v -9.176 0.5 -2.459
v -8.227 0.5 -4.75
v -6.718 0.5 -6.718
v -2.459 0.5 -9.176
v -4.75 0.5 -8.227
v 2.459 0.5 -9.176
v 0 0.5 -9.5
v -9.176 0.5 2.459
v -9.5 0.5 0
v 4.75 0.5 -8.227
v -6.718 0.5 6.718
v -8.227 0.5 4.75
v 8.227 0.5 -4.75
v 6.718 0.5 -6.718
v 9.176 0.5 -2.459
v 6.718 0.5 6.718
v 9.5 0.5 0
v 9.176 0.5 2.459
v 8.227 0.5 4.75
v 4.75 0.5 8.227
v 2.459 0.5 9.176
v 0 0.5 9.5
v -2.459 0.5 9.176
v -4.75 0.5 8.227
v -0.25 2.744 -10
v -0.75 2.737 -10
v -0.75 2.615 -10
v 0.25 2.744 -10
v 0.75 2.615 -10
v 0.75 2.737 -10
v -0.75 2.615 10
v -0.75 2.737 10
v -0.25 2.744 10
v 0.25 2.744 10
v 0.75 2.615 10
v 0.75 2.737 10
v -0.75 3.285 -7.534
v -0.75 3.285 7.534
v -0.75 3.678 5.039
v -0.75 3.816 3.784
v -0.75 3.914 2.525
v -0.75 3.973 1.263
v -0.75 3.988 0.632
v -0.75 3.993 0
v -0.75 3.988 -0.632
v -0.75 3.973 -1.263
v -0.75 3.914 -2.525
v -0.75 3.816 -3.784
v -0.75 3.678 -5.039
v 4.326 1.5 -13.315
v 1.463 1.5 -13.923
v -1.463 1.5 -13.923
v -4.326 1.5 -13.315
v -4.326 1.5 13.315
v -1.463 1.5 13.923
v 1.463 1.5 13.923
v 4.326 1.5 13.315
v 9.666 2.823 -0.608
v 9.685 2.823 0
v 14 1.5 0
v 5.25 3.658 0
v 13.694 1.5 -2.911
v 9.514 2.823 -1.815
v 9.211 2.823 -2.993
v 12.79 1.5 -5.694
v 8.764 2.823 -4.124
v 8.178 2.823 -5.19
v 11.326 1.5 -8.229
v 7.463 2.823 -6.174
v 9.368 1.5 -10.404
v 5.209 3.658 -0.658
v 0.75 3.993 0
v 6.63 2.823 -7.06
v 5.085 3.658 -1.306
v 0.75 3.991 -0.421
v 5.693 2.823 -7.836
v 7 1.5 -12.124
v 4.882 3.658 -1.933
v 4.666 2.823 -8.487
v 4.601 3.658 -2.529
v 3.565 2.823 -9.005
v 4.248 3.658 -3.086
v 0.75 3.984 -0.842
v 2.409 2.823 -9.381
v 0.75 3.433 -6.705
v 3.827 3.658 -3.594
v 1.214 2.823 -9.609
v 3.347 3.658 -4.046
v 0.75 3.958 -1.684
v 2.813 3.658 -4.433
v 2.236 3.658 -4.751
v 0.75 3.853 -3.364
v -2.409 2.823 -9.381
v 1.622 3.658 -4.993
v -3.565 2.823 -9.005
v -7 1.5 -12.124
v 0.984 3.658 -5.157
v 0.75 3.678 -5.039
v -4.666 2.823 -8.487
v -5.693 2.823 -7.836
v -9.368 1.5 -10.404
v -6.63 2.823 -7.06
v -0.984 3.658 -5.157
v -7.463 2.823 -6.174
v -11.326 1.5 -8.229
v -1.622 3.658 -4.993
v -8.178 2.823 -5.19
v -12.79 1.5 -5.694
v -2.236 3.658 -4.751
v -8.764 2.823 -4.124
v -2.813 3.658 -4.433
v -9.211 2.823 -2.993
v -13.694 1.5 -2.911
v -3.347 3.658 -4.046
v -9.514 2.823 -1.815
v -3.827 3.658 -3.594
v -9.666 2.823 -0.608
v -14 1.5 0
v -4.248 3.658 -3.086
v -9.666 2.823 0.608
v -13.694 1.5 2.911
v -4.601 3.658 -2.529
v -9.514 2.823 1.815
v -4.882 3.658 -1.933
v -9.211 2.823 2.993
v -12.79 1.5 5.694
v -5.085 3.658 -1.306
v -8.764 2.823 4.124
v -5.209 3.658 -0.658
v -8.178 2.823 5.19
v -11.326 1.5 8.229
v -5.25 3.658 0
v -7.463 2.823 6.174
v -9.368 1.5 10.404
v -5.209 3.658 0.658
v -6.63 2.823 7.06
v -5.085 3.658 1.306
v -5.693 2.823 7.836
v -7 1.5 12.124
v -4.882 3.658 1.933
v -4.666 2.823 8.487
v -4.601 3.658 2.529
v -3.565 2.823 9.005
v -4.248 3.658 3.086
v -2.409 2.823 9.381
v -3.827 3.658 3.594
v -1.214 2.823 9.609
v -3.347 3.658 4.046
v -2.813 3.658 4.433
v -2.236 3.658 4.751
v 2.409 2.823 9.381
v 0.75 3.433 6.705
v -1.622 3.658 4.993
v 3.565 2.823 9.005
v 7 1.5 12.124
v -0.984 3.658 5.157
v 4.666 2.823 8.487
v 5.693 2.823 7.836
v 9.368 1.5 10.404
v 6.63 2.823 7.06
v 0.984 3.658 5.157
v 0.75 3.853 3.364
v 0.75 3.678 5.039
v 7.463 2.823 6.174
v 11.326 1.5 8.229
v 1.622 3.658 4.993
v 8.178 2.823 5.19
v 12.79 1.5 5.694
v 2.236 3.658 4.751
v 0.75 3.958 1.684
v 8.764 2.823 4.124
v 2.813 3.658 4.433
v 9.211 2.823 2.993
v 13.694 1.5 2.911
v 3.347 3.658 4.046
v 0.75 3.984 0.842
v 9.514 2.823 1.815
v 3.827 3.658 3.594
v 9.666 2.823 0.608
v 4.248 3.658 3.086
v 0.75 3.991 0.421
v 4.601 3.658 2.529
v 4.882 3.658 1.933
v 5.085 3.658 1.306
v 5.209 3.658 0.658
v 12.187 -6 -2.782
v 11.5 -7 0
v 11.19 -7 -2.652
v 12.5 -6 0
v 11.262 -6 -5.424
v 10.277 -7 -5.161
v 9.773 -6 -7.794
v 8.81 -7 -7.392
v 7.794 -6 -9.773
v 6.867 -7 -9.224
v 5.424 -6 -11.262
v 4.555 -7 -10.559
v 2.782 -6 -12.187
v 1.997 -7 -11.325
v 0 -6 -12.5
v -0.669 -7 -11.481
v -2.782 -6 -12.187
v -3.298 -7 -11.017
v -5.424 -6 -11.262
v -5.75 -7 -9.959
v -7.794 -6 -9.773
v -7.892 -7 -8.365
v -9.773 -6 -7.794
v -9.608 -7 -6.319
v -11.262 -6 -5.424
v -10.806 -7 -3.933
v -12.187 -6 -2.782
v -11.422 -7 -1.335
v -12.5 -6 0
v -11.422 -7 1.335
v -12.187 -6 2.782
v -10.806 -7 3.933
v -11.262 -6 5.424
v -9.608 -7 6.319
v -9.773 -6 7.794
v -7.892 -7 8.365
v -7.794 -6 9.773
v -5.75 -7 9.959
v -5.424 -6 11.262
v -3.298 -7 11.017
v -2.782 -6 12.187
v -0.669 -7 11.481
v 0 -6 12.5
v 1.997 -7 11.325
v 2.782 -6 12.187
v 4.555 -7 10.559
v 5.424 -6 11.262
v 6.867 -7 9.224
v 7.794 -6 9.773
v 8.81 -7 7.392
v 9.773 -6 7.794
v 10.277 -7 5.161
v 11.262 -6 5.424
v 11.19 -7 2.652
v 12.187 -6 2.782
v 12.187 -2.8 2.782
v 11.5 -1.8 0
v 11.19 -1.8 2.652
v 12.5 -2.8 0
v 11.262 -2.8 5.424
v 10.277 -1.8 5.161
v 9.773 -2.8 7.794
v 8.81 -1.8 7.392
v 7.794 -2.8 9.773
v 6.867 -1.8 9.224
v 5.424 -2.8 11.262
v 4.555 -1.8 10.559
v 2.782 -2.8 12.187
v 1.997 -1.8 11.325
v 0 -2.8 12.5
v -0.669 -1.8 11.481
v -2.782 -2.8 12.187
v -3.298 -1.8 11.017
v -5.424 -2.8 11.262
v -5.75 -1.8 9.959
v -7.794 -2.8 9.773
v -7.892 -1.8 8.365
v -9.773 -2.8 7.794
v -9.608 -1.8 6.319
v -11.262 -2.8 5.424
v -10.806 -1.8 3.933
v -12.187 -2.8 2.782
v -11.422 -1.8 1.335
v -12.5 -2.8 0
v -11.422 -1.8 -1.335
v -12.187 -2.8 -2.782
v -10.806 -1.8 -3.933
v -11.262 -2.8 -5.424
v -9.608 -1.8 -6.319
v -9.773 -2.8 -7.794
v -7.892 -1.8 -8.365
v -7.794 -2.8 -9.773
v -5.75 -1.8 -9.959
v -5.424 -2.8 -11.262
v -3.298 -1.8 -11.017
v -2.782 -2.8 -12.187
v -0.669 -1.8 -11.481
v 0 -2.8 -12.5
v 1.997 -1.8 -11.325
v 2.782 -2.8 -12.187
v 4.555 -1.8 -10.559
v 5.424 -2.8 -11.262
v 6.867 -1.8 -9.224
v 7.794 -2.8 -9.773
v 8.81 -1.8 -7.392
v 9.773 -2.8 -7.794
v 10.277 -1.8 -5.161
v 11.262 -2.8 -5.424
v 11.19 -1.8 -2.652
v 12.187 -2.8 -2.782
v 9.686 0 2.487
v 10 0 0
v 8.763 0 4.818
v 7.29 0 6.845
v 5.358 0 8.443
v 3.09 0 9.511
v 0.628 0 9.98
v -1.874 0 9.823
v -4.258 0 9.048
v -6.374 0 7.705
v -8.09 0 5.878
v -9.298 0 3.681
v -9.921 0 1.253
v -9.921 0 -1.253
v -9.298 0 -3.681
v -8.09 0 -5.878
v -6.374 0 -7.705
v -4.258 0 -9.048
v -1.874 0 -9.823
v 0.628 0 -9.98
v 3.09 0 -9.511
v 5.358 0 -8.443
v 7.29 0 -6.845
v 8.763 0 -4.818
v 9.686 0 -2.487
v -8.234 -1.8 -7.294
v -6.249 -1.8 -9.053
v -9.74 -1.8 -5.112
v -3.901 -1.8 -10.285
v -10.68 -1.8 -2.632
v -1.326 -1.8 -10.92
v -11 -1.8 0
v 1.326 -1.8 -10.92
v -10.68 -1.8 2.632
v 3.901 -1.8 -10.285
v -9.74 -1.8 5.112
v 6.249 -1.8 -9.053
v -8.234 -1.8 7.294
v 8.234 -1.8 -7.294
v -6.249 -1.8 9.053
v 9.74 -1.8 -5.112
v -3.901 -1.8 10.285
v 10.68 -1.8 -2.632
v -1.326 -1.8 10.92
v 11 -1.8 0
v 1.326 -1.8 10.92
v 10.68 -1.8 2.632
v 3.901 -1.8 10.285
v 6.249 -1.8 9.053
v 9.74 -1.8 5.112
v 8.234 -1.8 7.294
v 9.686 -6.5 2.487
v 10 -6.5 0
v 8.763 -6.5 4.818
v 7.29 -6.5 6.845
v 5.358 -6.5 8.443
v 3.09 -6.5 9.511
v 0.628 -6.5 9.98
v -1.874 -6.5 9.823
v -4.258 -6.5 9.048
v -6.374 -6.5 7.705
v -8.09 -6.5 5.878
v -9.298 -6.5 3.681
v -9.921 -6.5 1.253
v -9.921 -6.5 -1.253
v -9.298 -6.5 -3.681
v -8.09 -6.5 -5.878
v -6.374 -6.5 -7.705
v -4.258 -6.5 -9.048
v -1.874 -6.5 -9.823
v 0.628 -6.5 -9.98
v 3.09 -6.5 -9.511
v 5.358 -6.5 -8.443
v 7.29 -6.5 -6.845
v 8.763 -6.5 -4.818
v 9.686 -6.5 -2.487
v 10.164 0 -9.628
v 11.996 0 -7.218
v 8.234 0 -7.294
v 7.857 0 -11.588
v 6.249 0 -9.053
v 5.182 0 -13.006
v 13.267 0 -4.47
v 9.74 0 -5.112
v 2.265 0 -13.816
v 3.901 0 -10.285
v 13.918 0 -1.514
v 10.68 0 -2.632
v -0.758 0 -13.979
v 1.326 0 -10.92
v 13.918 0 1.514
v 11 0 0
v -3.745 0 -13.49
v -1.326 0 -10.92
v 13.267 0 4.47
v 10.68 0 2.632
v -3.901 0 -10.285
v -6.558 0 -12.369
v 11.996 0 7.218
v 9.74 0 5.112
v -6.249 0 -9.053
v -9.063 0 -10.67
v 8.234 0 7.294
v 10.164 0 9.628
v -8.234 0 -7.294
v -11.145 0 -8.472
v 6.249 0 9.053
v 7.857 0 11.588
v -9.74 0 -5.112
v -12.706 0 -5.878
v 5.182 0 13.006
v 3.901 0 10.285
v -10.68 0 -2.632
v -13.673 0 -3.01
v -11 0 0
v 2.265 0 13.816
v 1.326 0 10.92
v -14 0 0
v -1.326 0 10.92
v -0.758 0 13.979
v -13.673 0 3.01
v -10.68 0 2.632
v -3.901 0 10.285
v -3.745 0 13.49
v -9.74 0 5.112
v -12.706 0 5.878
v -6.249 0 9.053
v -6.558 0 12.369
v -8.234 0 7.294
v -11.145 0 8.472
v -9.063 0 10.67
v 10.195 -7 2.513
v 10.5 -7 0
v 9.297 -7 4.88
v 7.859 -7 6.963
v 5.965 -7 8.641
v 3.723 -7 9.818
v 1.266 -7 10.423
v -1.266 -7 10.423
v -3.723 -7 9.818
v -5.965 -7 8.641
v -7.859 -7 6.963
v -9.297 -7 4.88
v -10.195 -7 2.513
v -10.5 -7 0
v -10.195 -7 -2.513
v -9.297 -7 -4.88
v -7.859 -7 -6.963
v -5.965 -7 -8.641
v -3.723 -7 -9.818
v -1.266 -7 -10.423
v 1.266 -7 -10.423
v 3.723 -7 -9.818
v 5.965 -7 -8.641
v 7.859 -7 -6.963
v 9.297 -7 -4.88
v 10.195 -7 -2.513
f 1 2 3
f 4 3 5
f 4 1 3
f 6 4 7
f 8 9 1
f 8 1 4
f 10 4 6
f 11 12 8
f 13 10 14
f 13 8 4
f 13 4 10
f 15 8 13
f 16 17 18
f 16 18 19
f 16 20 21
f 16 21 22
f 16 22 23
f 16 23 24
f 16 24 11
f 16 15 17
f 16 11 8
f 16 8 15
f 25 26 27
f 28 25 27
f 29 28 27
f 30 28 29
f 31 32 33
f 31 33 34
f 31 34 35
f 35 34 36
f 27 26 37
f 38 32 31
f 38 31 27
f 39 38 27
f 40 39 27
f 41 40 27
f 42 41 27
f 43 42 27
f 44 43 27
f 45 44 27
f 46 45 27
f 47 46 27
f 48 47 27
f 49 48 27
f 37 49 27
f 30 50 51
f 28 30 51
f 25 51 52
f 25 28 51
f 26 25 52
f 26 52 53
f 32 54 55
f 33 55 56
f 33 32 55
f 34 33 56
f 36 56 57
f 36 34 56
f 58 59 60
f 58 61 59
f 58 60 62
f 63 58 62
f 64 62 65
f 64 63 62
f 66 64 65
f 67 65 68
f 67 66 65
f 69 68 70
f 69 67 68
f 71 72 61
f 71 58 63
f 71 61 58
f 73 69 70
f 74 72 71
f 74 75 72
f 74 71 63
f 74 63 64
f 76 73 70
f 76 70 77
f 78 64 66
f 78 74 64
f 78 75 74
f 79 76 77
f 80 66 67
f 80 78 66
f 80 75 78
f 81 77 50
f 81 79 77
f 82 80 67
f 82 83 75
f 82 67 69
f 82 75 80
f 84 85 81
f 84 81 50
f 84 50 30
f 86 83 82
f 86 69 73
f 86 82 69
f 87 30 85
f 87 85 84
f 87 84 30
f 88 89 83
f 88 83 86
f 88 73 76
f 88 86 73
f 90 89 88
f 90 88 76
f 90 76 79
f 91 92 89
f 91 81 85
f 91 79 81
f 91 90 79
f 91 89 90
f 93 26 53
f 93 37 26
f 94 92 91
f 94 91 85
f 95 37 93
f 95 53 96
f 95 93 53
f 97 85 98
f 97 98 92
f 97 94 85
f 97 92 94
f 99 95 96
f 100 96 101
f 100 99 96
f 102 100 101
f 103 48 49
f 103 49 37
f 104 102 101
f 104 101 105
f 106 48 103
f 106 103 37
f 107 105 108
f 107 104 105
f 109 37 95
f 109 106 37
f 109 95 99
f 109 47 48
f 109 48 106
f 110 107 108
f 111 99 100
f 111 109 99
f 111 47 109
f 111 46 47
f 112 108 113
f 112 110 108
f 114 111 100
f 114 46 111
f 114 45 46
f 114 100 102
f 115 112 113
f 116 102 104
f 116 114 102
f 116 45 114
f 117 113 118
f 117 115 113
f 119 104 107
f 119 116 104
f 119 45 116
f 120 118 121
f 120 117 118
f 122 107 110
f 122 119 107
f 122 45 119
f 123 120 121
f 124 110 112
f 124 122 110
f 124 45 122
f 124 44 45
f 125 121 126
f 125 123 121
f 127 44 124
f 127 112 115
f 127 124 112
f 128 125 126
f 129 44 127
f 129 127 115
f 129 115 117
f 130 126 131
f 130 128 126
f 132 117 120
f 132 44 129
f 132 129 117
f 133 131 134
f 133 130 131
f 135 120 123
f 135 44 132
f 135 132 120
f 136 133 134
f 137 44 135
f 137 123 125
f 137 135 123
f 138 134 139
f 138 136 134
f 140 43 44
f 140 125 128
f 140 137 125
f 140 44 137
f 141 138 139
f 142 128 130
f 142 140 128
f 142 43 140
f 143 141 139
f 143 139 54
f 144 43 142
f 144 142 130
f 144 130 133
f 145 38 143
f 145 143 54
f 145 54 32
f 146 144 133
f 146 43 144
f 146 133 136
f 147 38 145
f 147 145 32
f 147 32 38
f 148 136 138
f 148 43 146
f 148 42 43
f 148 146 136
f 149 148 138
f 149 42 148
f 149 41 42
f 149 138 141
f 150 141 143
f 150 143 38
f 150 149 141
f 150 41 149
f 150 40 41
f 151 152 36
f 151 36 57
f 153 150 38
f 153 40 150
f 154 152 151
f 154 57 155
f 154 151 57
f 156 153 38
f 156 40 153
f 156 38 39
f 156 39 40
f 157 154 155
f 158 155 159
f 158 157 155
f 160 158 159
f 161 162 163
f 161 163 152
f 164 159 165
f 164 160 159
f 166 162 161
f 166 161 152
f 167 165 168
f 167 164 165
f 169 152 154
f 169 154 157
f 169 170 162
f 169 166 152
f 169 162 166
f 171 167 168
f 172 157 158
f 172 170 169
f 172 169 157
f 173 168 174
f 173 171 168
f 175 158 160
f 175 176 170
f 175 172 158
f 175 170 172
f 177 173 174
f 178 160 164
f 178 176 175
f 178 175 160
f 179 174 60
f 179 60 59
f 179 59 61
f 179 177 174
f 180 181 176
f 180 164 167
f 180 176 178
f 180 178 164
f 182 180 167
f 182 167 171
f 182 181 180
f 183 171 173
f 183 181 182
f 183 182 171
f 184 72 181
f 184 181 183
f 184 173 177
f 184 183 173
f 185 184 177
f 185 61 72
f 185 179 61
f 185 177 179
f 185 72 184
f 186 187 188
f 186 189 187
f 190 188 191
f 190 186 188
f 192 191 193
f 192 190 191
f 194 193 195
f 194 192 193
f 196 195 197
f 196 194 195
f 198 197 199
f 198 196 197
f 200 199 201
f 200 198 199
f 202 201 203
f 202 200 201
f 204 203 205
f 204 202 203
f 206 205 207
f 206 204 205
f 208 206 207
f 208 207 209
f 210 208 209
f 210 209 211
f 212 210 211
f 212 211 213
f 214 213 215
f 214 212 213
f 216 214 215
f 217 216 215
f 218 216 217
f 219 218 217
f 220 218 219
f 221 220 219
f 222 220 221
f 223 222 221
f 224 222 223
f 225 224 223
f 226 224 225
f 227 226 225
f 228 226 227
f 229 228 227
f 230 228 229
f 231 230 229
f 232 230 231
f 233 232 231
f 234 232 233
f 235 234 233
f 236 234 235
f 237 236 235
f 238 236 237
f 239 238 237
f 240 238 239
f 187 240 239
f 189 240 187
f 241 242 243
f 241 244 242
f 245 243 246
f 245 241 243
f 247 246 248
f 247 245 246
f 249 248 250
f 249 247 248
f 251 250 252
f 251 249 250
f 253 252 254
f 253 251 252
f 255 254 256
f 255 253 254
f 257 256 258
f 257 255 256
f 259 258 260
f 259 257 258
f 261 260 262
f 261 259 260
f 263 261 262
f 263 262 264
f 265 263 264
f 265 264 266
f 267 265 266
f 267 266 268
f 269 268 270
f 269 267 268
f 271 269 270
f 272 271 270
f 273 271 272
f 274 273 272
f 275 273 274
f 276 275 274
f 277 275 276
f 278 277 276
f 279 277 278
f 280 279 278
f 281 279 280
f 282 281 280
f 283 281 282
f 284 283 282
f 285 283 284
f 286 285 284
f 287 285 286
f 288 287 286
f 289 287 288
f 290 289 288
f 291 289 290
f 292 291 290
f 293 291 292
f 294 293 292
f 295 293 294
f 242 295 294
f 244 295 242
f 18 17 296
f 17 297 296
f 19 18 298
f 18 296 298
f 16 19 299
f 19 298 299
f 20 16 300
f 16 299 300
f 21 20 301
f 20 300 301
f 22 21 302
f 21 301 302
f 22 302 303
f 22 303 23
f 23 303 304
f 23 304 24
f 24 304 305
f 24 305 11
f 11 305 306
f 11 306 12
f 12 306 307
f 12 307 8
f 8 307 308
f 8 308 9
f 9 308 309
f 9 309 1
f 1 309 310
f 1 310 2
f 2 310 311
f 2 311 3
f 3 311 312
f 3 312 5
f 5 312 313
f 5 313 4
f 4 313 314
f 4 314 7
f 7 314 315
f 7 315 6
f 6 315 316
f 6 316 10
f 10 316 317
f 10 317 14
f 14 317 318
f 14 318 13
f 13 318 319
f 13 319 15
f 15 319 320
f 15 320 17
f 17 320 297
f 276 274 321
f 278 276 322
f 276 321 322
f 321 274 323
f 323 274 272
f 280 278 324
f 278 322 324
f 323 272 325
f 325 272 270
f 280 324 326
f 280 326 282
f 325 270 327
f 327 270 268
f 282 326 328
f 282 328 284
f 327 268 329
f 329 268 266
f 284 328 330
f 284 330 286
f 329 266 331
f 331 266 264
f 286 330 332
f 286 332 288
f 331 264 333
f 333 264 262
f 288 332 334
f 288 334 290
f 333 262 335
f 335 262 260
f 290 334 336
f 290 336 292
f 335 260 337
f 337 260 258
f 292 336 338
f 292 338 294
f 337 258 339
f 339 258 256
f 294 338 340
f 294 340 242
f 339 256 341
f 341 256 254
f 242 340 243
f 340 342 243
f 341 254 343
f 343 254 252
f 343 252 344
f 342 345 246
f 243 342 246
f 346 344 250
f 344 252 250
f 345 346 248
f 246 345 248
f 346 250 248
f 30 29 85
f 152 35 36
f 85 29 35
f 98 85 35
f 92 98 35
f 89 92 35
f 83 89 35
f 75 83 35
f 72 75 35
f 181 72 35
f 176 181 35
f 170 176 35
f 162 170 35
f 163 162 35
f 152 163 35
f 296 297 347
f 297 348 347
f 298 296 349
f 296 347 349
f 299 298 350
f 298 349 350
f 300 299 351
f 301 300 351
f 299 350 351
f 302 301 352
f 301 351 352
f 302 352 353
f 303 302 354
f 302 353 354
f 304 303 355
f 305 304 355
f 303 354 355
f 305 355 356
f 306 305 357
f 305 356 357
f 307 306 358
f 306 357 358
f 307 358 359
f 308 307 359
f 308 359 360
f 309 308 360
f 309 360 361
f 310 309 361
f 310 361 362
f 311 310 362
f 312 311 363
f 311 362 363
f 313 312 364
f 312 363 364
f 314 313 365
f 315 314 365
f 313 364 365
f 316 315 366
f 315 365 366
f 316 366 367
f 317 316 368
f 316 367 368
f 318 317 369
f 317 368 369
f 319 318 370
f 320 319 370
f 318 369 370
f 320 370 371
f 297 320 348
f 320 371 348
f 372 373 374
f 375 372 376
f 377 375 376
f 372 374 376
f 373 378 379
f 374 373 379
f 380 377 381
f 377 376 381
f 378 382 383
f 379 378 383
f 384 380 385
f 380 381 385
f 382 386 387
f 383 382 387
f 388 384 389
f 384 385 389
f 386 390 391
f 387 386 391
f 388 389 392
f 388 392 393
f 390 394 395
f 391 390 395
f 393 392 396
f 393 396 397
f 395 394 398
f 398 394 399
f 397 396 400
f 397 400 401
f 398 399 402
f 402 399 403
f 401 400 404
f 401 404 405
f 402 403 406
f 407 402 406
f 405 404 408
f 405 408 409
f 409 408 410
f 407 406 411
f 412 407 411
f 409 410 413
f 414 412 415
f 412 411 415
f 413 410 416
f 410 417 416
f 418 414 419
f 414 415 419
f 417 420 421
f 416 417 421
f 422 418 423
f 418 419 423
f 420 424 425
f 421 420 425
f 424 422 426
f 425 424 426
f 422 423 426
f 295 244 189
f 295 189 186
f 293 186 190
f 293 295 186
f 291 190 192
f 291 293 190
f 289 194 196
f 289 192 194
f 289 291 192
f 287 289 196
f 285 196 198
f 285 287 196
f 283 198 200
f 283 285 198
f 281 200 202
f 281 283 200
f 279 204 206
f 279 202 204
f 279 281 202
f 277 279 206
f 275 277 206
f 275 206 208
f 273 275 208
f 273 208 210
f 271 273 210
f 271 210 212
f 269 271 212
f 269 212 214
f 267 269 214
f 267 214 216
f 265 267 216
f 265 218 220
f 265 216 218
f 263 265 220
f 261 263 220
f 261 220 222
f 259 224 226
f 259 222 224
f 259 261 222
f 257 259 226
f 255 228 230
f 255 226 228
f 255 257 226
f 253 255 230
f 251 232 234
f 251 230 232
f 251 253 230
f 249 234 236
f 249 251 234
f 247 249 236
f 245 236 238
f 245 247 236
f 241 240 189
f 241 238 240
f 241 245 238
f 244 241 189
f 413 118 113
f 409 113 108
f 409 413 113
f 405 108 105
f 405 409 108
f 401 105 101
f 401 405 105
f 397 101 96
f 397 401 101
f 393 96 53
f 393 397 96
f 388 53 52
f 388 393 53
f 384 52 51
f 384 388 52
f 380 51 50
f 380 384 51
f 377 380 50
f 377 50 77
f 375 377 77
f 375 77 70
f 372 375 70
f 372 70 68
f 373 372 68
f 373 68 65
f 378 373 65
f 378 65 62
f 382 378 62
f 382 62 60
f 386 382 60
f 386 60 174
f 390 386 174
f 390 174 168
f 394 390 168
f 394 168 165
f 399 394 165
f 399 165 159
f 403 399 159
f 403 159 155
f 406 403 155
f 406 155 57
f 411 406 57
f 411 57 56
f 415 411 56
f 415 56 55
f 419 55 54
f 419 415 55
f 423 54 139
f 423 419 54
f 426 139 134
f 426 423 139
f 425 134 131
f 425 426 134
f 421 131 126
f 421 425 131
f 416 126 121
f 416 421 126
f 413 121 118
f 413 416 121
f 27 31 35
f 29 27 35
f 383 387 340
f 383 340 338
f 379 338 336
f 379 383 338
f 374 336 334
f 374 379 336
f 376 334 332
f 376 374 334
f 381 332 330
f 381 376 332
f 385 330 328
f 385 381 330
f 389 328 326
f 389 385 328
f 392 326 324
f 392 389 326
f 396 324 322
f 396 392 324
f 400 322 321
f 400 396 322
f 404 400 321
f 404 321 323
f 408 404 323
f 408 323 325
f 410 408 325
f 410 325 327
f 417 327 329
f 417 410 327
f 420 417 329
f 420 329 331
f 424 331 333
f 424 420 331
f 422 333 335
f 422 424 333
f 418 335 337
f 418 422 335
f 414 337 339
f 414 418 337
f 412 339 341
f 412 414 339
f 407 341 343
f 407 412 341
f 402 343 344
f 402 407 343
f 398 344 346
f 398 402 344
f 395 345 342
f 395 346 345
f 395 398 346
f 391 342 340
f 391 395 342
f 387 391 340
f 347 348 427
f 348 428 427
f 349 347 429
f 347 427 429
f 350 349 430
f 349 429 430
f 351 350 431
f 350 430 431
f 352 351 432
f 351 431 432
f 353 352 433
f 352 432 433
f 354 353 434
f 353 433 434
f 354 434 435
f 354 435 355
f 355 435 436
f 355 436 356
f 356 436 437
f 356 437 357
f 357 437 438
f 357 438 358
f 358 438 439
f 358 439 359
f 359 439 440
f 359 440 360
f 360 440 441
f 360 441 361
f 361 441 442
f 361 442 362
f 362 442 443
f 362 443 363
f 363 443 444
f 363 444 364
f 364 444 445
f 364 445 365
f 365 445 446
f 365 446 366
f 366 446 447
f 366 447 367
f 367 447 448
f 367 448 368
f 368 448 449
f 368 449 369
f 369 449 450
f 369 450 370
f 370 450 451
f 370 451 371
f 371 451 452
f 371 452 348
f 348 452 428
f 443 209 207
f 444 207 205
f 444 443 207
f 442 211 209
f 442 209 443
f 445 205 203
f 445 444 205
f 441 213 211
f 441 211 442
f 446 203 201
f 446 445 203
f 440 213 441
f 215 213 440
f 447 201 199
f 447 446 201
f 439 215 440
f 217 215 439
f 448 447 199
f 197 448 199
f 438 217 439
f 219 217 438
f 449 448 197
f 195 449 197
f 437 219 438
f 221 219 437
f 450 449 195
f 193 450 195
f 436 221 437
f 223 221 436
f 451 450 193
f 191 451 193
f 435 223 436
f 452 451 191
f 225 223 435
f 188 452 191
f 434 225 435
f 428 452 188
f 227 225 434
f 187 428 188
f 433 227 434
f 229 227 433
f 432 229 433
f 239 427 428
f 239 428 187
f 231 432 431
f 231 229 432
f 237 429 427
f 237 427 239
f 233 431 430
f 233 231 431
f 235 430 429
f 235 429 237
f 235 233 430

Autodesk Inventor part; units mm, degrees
ref_plane "YZ Plane" through (0, 0, 0) normal (1, 0, 0) x (0, 1, 0)
ref_plane "XZ Plane" through (0, 0, 0) normal (0, 1, 0) x (-1, 0, 0)
ref_plane "XY Plane" through (0, 0, 0) normal (0, 0, 1) x (1, 0, 0)
sketch "Sketch1" plane through (0, 0, 0) normal (0, 1, 0) x (-1, 0, 0)
  circle A0 centre (0, 0) radius 14
  dimension "d0" = 28
extrude "Extrusion1" add sketch "Sketch1" along normal blind 1.5
sketch "Sketch2" plane through (0, 0, 0) normal (0, -1, 0) x (1, 0, 0)
  circle A0 centre (0, 0) radius 11
  dimension "d3" = 22
extrude "Extrusion2" add sketch "Sketch2" along normal blind 1.8
sketch "Sketch3" plane through (0, -1.8, 0) normal (0, -1, 0) x (1, 0, 0)
  circle A0 centre (0, 0) radius 12.5
  dimension "d6" = 25
extrude "Extrusion3" add sketch "Sketch3" along normal blind 5.2
chamfer "Chamfer1" distance 1 angle 45 2 edges at (-12.5, -1.8, 0) (-12.5, -7, 0)
thread "Thread1" size "M25x2" class "6g" standard "ANSI Metric M Profile" full length
sketch "Sketch4" plane through (0, 0, 0) normal (0, 0, 1) x (1, 0, 0)
  line L0 (0, 11.1309) -> (0, -17.3821)
  line L1 (14, 1.5) -> (-14, 1.5) projected
  circle A0 centre (0, -36.45) radius 40.45
  line L2 (11.5, -7) -> (-11.5, -7) projected
  point P0 (0, 0)
  point P1 (0, 4)
  point P2 (0, 1.5)
  dimension "d15" = 11
revolve "Revolution1" add sketch "Sketch4" angle 360 about axis through (0, 11.1309, 0) along (0, -1, 0) picked at (7.8142, 1.9608) contours A0 L1 L0
sketch "Sketch5" plane through (0, 0, 0) normal (0, 0, 1) x (1, 0, 0)
  line L0 (-0.75, 5.2944) -> (-0.75, 2.6153)
  line L1 (-0.75, 2.6153) -> (0.75, 2.6153)
  line L2 (0.75, 2.6153) -> (0.75, 5.2944)
  line L3 (0.75, 5.2944) -> (-0.75, 5.2944)
  line L4 (-0.75, 5.2944) -> (0.75, 2.6153) construction
  line L5 (-0.75, 2.6153) -> (0.75, 5.2944) construction
  point P0 (0, 0)
  point P1 (0, 3.9548)
  dimension "d17" = 1.5
extrude "Extrusion4" cut sketch "Sketch5" against normal mid plane 20
sketch "Sketch6" plane through (0, -7, 0) normal (0, -1, 0) x (1, 0, 0)
  circle A0 centre (0, 0) radius 10
  dimension "d20" = 20
extrude "Extrusion5" cut sketch "Sketch6" against normal blind 7.5
chamfer "Chamfer2" distance 0.5 angle 45 2 edges at (-10, 0.5, 0) (-10, -7, 0)
properties part number "Cartridge Glans Cover RS 406-9413 LAPP"
